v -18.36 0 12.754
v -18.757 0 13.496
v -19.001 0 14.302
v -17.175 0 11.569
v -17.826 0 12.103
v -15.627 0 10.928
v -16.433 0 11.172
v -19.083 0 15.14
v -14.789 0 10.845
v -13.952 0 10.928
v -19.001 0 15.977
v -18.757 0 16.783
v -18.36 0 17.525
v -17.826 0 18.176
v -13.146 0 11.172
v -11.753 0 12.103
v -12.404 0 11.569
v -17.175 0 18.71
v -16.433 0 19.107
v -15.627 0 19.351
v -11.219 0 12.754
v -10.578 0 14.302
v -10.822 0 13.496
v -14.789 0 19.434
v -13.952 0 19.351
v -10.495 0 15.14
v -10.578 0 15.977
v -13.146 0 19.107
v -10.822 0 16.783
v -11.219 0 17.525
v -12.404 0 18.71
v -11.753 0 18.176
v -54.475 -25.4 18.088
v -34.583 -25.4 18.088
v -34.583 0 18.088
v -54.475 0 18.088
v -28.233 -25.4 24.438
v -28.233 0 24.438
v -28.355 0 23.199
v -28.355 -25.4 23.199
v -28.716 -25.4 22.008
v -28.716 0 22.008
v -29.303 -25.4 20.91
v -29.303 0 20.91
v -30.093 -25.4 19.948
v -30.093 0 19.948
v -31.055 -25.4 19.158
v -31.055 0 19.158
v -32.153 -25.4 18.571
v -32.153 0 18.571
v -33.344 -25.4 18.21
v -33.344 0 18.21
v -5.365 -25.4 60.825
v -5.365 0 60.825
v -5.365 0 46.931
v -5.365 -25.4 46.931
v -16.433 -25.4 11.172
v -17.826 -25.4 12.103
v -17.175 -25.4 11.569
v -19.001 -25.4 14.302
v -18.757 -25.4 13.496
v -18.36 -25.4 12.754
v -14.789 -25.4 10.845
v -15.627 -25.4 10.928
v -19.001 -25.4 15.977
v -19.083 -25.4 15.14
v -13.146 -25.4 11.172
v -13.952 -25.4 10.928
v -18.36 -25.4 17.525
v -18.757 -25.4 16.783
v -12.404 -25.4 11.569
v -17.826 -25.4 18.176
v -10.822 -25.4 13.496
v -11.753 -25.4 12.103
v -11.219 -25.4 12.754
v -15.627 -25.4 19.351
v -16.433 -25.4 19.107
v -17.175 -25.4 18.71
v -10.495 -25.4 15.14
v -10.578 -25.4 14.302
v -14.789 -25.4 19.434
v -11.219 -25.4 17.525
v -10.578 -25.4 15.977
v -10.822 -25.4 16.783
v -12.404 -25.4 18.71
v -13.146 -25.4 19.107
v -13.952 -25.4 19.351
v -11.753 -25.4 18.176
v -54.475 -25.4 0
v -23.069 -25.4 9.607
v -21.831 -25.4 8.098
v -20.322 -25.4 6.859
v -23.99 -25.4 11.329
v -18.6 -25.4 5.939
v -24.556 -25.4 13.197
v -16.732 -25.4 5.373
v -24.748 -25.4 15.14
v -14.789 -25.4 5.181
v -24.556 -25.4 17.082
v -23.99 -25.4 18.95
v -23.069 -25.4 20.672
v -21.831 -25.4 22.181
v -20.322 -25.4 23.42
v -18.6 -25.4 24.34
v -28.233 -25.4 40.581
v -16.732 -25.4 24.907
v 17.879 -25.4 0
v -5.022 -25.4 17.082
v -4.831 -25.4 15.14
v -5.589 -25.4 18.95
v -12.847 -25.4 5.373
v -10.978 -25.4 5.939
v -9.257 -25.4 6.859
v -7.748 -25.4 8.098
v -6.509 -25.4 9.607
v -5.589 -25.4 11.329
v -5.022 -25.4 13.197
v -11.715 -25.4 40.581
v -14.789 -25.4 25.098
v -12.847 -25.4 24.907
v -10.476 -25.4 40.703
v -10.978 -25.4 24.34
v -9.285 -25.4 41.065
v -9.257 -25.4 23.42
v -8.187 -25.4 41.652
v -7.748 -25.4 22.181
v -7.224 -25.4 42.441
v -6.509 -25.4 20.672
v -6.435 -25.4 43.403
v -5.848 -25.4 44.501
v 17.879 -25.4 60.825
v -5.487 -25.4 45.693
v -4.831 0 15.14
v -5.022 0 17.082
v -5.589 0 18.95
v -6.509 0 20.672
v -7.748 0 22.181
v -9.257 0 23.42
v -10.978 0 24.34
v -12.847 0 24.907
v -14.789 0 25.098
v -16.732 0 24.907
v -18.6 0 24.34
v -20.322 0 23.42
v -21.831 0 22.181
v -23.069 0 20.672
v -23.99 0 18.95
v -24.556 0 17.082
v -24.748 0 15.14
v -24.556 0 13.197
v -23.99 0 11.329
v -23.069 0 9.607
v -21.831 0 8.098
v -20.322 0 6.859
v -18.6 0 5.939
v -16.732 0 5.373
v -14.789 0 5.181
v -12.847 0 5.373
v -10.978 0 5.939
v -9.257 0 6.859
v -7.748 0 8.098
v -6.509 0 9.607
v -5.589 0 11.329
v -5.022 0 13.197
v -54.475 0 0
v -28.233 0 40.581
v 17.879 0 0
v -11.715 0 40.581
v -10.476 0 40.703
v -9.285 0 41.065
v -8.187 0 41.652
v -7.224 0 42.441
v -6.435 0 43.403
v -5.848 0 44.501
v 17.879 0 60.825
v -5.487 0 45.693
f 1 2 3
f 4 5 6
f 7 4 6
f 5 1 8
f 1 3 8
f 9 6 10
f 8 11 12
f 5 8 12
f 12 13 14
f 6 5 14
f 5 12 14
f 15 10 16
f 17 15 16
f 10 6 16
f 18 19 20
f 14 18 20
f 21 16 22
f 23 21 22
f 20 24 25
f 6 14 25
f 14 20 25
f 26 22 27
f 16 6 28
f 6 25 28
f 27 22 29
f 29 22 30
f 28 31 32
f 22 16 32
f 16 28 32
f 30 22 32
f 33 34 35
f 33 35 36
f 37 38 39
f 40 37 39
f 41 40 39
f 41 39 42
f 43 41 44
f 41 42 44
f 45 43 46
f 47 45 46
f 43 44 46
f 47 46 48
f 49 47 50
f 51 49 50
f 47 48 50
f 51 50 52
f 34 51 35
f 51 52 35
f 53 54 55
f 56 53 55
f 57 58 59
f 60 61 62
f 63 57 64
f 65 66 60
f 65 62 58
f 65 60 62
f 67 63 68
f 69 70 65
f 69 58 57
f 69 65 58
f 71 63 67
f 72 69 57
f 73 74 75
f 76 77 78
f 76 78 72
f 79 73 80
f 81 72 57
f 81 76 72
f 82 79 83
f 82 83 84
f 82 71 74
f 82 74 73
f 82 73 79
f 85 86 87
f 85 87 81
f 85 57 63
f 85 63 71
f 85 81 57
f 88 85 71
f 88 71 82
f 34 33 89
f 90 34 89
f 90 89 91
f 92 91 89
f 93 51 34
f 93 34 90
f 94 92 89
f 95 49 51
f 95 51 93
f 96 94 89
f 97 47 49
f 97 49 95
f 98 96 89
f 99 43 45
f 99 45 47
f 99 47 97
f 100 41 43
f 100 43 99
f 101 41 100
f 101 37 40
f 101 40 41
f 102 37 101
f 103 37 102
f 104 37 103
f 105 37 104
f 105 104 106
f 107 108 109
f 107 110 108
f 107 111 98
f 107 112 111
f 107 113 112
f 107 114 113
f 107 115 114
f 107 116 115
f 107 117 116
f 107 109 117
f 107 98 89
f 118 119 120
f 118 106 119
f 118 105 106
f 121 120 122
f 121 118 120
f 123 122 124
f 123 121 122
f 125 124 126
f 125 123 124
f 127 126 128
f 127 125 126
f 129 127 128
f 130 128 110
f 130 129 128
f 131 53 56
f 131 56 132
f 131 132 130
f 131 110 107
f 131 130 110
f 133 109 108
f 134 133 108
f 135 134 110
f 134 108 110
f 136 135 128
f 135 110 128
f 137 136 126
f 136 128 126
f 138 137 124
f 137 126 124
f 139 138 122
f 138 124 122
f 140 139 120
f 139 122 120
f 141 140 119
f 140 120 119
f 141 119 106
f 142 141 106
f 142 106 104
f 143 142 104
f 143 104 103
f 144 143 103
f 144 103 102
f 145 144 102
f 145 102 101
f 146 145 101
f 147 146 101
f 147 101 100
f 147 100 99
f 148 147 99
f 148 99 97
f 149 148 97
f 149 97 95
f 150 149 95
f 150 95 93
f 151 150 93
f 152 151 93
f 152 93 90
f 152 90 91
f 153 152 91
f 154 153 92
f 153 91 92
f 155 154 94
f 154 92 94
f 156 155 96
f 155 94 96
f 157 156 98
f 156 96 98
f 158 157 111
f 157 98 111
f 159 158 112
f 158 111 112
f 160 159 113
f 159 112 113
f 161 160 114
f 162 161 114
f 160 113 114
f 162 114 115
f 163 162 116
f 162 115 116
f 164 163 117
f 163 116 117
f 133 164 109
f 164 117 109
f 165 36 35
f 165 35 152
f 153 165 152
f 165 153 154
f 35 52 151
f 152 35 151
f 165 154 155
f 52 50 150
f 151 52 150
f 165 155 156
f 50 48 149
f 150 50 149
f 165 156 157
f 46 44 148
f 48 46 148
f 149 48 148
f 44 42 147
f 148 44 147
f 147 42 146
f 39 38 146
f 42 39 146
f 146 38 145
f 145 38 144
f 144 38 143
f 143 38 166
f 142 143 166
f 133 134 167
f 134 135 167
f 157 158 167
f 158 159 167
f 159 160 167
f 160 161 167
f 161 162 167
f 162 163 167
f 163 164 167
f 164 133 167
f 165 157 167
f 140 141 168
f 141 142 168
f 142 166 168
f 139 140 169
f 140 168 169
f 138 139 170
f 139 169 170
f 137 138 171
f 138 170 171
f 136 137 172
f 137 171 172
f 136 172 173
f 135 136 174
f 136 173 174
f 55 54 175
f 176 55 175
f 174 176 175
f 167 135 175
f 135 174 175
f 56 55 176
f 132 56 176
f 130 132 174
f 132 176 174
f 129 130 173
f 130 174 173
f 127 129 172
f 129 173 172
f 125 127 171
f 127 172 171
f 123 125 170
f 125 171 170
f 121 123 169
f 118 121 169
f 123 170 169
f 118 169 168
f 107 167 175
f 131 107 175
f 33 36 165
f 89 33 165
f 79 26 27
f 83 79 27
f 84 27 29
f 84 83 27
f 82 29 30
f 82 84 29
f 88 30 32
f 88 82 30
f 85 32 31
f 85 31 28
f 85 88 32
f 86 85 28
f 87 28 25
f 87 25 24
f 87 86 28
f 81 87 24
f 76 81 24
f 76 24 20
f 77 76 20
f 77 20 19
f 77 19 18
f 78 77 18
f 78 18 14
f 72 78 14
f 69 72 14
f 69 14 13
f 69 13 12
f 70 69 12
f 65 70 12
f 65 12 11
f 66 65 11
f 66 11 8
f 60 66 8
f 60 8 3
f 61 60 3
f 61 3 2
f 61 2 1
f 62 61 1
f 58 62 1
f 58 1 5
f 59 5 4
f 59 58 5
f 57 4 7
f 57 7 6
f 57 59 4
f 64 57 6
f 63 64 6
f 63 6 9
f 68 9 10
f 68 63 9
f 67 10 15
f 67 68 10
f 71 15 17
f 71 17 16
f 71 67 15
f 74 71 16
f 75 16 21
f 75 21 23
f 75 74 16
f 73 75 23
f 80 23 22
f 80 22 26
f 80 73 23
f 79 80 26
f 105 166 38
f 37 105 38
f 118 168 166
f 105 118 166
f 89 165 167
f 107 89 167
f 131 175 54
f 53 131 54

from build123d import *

# Parameters (mm, degrees)
F1_DEPTH = 25.4
F2_R     = 9.95833
F2_R_2   = 4.294163
F3_DEPTH = 45.6


with BuildPart() as f1:
    # F0 (on Front) → F1 (new body)
    with BuildSketch(Plane.XZ):
        with BuildLine():
            Line((-54.475233, 18.087925), (-54.475233, 0))
            Line((-54.475233, 0), (17.878575, 0))
            Line((17.878575, 0), (17.878575, 58.950953))
            Line((17.878575, 58.950953), (17.878575, 60.825408))
            Line((17.878575, 60.825408), (-5.364616, 60.825408))
            Line((-5.364616, 60.825408), (-5.364616, 46.931338))
            ThreePointArc((-5.364616, 46.931338), (-7.224488, 42.44121), (-11.714616, 40.581338))
            Line((-11.714616, 40.581338), (-27.483137, 40.581338))
            Line((-27.483137, 40.581338), (-28.232917, 40.581338))
            Line((-28.232917, 40.581338), (-28.232917, 24.437925))
            ThreePointArc((-28.232917, 24.437925), (-30.092789, 19.947797), (-34.582917, 18.087925))
            Line((-34.582917, 18.087925), (-54.475233, 18.087925))
        make_face()
    extrude(amount=F1_DEPTH)

    # F2 (on face) → F3 (cut)
    with BuildSketch(Plane.XZ.offset(25.4)):
        with Locations((-14.789276, 15.139529)):
            Circle(F2_R)
        with Locations((-14.789276, 15.139529)):
            Circle(F2_R_2, mode=Mode.SUBTRACT)
    extrude(amount=-F3_DEPTH, mode=Mode.SUBTRACT)


solid = f1.part
